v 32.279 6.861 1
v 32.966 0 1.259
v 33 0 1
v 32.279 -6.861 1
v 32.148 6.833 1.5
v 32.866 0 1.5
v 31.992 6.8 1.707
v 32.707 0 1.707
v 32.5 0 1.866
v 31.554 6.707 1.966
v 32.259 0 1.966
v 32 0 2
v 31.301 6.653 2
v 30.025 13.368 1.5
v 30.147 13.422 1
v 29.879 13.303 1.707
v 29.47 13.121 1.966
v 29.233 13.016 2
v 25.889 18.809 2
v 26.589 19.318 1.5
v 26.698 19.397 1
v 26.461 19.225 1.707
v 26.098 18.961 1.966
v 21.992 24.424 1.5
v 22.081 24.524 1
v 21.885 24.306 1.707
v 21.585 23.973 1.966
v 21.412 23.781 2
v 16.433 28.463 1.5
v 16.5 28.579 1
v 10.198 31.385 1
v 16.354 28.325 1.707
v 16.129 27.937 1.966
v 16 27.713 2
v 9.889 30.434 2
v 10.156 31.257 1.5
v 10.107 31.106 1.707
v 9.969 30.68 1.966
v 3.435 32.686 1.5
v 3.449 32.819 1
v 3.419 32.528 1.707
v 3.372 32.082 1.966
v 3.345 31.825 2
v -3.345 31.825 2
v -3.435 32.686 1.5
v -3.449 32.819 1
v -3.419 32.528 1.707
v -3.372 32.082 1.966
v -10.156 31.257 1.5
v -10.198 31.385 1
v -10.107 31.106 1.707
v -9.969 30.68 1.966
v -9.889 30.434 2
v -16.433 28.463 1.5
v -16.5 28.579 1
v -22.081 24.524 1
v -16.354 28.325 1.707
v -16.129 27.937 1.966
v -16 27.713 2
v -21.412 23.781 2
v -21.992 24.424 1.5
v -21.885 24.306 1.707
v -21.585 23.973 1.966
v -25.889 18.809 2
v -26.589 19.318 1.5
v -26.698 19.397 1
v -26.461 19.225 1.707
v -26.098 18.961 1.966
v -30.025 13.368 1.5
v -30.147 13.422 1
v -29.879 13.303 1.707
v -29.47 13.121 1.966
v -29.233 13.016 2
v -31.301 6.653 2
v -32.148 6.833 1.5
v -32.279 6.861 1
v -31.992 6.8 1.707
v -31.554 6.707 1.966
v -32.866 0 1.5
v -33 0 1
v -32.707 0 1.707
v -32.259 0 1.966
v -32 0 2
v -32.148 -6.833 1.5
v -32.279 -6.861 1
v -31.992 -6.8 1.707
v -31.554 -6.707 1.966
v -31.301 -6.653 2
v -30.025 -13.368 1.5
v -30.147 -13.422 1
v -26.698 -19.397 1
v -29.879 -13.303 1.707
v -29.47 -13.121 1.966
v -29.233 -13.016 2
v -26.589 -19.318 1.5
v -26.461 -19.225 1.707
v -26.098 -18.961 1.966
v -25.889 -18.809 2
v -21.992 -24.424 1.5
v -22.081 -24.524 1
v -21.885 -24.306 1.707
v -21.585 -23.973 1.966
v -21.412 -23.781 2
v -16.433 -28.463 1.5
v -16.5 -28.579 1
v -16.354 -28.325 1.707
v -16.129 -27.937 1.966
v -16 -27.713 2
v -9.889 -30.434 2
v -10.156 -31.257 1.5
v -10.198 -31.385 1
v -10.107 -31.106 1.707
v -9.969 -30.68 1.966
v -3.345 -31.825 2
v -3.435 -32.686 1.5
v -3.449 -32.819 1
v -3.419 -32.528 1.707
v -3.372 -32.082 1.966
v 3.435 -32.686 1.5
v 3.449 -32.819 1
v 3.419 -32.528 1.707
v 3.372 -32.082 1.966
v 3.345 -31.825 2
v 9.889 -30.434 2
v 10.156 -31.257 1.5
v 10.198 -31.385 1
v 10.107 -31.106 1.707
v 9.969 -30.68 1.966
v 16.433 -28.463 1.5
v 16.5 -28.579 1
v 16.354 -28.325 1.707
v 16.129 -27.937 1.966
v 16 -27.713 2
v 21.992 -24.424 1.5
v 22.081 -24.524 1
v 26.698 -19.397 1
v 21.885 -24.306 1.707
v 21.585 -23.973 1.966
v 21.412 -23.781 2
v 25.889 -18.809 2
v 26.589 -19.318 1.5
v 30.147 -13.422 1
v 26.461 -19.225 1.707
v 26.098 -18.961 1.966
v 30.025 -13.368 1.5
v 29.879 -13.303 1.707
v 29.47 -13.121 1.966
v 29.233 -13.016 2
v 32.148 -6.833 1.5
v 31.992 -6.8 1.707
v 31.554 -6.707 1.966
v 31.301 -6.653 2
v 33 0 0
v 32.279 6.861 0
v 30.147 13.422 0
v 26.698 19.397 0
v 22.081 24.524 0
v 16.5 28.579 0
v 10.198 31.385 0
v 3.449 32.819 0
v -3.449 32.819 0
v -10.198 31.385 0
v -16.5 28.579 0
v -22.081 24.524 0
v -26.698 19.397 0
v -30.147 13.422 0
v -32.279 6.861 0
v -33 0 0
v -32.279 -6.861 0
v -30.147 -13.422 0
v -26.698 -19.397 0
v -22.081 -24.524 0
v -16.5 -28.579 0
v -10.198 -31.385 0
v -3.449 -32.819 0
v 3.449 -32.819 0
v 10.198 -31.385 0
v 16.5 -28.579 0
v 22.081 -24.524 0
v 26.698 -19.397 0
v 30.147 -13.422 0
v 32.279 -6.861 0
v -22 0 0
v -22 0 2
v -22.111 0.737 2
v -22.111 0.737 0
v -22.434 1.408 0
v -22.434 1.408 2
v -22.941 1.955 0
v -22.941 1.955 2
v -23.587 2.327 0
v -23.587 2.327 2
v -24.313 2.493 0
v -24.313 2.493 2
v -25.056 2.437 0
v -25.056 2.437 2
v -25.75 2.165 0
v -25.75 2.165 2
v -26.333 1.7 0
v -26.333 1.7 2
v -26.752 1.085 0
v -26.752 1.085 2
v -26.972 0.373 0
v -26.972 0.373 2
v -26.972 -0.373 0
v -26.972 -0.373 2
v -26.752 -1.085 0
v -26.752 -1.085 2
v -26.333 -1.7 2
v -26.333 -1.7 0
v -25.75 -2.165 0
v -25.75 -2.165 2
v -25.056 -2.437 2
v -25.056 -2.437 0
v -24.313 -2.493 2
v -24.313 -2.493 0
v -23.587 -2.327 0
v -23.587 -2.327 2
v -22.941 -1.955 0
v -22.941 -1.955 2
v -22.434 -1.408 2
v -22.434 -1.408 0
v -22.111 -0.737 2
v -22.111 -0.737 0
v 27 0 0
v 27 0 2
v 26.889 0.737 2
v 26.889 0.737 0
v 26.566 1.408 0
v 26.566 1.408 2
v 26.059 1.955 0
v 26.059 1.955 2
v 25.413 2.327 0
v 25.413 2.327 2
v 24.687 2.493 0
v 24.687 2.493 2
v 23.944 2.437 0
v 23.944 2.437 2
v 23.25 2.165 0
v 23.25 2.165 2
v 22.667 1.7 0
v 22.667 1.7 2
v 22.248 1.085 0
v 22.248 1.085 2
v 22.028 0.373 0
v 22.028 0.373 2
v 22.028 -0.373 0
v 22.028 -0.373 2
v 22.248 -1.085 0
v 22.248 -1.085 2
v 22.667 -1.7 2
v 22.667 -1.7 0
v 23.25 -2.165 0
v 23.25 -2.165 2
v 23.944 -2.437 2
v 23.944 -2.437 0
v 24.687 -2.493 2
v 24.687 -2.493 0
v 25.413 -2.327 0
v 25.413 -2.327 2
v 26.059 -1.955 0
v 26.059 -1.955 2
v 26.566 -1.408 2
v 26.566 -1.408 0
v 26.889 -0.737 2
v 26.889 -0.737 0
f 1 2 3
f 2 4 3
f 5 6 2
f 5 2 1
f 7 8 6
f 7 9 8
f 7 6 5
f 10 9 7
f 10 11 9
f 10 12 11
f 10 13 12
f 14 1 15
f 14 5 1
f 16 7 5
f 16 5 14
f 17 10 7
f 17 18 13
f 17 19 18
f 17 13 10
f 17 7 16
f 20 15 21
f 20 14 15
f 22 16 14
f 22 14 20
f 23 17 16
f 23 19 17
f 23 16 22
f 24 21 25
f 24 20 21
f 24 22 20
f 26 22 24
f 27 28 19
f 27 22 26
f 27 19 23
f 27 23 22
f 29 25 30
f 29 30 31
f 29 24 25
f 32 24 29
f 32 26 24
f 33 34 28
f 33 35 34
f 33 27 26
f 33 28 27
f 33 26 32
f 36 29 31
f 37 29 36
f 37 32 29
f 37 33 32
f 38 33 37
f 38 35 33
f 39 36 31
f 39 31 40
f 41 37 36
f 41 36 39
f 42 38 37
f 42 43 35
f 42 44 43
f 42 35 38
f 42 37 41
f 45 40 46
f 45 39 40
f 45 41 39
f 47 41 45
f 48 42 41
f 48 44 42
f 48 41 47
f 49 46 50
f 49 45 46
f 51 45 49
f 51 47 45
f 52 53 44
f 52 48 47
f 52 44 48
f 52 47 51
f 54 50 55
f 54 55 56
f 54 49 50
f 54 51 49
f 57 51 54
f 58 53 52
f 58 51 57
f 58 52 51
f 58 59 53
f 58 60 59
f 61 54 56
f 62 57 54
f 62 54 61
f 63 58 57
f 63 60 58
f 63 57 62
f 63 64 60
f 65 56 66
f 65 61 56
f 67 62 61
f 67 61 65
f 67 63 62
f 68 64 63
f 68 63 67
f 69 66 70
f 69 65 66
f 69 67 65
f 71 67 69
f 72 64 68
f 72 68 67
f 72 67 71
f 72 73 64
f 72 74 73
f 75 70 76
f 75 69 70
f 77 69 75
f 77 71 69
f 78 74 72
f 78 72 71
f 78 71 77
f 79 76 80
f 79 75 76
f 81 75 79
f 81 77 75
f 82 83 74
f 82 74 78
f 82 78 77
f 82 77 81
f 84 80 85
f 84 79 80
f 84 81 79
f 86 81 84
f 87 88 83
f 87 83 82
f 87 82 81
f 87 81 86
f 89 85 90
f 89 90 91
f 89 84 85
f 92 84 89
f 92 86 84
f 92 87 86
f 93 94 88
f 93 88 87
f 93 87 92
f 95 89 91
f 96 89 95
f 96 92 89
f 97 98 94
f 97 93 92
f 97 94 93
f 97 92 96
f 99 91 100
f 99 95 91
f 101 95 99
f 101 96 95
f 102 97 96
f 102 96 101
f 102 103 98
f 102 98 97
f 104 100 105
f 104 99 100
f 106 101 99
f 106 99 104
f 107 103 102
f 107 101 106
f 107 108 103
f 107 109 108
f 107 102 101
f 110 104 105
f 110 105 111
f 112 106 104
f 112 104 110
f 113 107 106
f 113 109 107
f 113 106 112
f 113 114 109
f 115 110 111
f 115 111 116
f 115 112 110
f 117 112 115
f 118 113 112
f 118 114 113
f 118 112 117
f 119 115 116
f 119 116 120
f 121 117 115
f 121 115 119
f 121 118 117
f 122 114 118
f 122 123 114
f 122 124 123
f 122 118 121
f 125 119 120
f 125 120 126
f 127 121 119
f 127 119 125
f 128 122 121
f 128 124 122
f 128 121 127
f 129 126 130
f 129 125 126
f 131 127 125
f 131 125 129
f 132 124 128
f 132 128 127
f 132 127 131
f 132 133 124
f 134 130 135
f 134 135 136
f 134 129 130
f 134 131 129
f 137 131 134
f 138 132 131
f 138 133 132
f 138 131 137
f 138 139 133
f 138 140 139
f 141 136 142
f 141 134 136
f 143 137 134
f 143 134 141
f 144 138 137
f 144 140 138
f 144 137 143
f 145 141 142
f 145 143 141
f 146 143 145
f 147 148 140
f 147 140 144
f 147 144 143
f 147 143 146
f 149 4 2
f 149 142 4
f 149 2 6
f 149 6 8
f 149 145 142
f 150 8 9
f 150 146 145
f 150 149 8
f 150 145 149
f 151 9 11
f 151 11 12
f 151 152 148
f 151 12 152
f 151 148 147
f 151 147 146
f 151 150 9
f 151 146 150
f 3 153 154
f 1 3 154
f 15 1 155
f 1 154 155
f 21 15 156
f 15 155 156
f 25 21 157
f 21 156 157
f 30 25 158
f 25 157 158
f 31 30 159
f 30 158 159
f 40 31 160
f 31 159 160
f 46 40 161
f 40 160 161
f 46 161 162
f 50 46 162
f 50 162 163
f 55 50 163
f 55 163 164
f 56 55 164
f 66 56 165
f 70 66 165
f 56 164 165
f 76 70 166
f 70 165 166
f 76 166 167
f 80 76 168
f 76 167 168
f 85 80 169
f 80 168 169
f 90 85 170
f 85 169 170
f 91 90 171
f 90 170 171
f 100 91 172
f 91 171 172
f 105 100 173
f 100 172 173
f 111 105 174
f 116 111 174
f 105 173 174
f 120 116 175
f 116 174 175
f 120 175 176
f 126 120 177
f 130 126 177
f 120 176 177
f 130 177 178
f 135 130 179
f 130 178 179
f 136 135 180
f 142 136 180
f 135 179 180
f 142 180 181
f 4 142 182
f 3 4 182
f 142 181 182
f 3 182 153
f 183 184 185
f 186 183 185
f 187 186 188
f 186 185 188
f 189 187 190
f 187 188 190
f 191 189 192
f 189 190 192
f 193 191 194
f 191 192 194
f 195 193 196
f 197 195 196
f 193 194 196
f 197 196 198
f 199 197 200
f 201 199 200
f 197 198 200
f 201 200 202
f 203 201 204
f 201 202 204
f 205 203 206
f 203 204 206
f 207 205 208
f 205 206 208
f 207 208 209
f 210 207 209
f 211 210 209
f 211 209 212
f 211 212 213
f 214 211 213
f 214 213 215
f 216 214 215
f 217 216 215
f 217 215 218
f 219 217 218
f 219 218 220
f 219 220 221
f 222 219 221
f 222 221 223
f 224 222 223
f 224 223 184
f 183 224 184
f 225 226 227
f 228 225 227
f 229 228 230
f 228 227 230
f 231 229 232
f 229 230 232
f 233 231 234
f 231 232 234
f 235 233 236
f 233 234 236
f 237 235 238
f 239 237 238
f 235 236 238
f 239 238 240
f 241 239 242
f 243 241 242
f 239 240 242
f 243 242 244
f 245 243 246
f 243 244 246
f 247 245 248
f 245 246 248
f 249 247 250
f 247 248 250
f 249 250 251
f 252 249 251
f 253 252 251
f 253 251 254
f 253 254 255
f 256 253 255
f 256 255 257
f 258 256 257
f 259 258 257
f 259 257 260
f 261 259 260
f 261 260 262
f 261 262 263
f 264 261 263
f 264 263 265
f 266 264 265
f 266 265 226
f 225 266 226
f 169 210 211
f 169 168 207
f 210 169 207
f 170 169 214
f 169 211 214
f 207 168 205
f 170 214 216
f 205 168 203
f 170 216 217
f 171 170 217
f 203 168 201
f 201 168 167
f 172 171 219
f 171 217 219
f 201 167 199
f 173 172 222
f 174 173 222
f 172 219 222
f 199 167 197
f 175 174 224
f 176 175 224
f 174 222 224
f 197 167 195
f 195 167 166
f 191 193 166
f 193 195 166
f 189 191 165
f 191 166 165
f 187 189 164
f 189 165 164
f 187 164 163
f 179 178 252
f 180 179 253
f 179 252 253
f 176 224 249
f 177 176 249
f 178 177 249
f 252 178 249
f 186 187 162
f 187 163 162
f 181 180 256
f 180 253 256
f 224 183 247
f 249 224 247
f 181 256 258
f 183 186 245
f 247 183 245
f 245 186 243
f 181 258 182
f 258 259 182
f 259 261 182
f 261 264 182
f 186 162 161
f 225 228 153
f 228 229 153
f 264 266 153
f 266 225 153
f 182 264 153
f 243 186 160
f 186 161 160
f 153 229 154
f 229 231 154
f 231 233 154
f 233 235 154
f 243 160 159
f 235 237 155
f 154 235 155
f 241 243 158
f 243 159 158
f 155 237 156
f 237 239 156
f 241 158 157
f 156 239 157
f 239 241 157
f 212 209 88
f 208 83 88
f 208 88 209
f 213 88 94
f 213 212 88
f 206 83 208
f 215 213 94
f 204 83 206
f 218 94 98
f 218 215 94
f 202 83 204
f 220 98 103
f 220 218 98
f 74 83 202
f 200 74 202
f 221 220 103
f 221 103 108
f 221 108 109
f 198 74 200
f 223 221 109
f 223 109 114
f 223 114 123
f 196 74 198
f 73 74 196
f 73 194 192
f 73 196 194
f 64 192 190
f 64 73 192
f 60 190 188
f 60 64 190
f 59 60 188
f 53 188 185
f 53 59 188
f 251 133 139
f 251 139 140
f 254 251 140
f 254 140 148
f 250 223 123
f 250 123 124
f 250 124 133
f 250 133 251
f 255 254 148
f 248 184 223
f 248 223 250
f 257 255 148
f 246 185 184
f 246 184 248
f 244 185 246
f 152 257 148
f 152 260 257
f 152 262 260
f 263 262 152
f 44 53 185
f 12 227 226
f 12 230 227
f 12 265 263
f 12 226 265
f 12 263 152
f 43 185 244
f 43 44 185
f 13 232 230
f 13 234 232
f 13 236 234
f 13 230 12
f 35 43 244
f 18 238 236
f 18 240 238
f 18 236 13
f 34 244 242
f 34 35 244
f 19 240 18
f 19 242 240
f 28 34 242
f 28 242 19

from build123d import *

# Parameters (mm, degrees)
F0_R     = 33
F1_DEPTH = 2
F2_R     = 2.5
F3_DEPTH = 25
F4_R     = 1


with BuildPart() as f1:
    # F0 (on Top) → F1 (new body)
    with BuildSketch(Plane.XY):
        Circle(F0_R)
    extrude(amount=F1_DEPTH)

    # F2 (on face) → F3 (cut)
    with BuildSketch(Plane.XY.offset(2)):
        with Locations((-24.5, 0)):
            Circle(F2_R)
        with Locations((24.5, 0)):
            Circle(F2_R)
    extrude(amount=-F3_DEPTH, mode=Mode.SUBTRACT)

    # F4
    f4_edges = [f1.edges().sort_by_distance(p)[0] for p in [
        (-33, 0, 2),
    ]]
    fillet(f4_edges, radius=F4_R)


solid = f1.part
